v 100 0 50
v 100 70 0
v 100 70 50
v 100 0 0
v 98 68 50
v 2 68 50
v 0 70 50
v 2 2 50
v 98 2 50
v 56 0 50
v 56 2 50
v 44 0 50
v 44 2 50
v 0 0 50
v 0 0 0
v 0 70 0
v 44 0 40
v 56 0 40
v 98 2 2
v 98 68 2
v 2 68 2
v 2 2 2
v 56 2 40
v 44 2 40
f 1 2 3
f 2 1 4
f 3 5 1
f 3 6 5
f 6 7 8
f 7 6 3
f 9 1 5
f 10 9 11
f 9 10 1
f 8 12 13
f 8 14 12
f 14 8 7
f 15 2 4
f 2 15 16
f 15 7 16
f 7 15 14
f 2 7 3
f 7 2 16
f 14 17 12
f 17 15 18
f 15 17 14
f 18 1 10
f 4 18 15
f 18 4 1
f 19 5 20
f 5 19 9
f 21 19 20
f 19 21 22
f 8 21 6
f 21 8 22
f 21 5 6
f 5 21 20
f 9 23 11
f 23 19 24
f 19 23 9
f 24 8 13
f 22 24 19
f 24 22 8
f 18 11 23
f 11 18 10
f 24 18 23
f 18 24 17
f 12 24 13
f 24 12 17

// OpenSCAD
$fn = 32;

// ----------------------------------------------------------------------
// Enclosure box: notch enclosure
// ----------------------------------------------------------------------

// --- parameters (mm) ---
box_l = 100;              // outer length, X
box_w = 70;               // outer width, Y
box_h = 50;               // outer height
wall_t = 2;               // wall thickness
notch_w = 12;             // cable notch width
notch_h = 10;             // cable notch height
fit_tol = 0.1;            // tolerance for press fits, mm
free_tol = 0.5;           // tolerance for clearance fits, mm

inner_h = box_h - wall_t;  // cavity depth
boss_h = inner_h - 2;  // corner boss height

difference() {
  cube([box_l, box_w, box_h]);
  translate([wall_t, wall_t, wall_t])
    cube([box_l - 2 * wall_t, box_w - 2 * wall_t, box_h]);
  translate([box_l / 2 - notch_w / 2, -1, box_h - notch_h])
    cube([notch_w, wall_t + 2, notch_h + 1]);
}
